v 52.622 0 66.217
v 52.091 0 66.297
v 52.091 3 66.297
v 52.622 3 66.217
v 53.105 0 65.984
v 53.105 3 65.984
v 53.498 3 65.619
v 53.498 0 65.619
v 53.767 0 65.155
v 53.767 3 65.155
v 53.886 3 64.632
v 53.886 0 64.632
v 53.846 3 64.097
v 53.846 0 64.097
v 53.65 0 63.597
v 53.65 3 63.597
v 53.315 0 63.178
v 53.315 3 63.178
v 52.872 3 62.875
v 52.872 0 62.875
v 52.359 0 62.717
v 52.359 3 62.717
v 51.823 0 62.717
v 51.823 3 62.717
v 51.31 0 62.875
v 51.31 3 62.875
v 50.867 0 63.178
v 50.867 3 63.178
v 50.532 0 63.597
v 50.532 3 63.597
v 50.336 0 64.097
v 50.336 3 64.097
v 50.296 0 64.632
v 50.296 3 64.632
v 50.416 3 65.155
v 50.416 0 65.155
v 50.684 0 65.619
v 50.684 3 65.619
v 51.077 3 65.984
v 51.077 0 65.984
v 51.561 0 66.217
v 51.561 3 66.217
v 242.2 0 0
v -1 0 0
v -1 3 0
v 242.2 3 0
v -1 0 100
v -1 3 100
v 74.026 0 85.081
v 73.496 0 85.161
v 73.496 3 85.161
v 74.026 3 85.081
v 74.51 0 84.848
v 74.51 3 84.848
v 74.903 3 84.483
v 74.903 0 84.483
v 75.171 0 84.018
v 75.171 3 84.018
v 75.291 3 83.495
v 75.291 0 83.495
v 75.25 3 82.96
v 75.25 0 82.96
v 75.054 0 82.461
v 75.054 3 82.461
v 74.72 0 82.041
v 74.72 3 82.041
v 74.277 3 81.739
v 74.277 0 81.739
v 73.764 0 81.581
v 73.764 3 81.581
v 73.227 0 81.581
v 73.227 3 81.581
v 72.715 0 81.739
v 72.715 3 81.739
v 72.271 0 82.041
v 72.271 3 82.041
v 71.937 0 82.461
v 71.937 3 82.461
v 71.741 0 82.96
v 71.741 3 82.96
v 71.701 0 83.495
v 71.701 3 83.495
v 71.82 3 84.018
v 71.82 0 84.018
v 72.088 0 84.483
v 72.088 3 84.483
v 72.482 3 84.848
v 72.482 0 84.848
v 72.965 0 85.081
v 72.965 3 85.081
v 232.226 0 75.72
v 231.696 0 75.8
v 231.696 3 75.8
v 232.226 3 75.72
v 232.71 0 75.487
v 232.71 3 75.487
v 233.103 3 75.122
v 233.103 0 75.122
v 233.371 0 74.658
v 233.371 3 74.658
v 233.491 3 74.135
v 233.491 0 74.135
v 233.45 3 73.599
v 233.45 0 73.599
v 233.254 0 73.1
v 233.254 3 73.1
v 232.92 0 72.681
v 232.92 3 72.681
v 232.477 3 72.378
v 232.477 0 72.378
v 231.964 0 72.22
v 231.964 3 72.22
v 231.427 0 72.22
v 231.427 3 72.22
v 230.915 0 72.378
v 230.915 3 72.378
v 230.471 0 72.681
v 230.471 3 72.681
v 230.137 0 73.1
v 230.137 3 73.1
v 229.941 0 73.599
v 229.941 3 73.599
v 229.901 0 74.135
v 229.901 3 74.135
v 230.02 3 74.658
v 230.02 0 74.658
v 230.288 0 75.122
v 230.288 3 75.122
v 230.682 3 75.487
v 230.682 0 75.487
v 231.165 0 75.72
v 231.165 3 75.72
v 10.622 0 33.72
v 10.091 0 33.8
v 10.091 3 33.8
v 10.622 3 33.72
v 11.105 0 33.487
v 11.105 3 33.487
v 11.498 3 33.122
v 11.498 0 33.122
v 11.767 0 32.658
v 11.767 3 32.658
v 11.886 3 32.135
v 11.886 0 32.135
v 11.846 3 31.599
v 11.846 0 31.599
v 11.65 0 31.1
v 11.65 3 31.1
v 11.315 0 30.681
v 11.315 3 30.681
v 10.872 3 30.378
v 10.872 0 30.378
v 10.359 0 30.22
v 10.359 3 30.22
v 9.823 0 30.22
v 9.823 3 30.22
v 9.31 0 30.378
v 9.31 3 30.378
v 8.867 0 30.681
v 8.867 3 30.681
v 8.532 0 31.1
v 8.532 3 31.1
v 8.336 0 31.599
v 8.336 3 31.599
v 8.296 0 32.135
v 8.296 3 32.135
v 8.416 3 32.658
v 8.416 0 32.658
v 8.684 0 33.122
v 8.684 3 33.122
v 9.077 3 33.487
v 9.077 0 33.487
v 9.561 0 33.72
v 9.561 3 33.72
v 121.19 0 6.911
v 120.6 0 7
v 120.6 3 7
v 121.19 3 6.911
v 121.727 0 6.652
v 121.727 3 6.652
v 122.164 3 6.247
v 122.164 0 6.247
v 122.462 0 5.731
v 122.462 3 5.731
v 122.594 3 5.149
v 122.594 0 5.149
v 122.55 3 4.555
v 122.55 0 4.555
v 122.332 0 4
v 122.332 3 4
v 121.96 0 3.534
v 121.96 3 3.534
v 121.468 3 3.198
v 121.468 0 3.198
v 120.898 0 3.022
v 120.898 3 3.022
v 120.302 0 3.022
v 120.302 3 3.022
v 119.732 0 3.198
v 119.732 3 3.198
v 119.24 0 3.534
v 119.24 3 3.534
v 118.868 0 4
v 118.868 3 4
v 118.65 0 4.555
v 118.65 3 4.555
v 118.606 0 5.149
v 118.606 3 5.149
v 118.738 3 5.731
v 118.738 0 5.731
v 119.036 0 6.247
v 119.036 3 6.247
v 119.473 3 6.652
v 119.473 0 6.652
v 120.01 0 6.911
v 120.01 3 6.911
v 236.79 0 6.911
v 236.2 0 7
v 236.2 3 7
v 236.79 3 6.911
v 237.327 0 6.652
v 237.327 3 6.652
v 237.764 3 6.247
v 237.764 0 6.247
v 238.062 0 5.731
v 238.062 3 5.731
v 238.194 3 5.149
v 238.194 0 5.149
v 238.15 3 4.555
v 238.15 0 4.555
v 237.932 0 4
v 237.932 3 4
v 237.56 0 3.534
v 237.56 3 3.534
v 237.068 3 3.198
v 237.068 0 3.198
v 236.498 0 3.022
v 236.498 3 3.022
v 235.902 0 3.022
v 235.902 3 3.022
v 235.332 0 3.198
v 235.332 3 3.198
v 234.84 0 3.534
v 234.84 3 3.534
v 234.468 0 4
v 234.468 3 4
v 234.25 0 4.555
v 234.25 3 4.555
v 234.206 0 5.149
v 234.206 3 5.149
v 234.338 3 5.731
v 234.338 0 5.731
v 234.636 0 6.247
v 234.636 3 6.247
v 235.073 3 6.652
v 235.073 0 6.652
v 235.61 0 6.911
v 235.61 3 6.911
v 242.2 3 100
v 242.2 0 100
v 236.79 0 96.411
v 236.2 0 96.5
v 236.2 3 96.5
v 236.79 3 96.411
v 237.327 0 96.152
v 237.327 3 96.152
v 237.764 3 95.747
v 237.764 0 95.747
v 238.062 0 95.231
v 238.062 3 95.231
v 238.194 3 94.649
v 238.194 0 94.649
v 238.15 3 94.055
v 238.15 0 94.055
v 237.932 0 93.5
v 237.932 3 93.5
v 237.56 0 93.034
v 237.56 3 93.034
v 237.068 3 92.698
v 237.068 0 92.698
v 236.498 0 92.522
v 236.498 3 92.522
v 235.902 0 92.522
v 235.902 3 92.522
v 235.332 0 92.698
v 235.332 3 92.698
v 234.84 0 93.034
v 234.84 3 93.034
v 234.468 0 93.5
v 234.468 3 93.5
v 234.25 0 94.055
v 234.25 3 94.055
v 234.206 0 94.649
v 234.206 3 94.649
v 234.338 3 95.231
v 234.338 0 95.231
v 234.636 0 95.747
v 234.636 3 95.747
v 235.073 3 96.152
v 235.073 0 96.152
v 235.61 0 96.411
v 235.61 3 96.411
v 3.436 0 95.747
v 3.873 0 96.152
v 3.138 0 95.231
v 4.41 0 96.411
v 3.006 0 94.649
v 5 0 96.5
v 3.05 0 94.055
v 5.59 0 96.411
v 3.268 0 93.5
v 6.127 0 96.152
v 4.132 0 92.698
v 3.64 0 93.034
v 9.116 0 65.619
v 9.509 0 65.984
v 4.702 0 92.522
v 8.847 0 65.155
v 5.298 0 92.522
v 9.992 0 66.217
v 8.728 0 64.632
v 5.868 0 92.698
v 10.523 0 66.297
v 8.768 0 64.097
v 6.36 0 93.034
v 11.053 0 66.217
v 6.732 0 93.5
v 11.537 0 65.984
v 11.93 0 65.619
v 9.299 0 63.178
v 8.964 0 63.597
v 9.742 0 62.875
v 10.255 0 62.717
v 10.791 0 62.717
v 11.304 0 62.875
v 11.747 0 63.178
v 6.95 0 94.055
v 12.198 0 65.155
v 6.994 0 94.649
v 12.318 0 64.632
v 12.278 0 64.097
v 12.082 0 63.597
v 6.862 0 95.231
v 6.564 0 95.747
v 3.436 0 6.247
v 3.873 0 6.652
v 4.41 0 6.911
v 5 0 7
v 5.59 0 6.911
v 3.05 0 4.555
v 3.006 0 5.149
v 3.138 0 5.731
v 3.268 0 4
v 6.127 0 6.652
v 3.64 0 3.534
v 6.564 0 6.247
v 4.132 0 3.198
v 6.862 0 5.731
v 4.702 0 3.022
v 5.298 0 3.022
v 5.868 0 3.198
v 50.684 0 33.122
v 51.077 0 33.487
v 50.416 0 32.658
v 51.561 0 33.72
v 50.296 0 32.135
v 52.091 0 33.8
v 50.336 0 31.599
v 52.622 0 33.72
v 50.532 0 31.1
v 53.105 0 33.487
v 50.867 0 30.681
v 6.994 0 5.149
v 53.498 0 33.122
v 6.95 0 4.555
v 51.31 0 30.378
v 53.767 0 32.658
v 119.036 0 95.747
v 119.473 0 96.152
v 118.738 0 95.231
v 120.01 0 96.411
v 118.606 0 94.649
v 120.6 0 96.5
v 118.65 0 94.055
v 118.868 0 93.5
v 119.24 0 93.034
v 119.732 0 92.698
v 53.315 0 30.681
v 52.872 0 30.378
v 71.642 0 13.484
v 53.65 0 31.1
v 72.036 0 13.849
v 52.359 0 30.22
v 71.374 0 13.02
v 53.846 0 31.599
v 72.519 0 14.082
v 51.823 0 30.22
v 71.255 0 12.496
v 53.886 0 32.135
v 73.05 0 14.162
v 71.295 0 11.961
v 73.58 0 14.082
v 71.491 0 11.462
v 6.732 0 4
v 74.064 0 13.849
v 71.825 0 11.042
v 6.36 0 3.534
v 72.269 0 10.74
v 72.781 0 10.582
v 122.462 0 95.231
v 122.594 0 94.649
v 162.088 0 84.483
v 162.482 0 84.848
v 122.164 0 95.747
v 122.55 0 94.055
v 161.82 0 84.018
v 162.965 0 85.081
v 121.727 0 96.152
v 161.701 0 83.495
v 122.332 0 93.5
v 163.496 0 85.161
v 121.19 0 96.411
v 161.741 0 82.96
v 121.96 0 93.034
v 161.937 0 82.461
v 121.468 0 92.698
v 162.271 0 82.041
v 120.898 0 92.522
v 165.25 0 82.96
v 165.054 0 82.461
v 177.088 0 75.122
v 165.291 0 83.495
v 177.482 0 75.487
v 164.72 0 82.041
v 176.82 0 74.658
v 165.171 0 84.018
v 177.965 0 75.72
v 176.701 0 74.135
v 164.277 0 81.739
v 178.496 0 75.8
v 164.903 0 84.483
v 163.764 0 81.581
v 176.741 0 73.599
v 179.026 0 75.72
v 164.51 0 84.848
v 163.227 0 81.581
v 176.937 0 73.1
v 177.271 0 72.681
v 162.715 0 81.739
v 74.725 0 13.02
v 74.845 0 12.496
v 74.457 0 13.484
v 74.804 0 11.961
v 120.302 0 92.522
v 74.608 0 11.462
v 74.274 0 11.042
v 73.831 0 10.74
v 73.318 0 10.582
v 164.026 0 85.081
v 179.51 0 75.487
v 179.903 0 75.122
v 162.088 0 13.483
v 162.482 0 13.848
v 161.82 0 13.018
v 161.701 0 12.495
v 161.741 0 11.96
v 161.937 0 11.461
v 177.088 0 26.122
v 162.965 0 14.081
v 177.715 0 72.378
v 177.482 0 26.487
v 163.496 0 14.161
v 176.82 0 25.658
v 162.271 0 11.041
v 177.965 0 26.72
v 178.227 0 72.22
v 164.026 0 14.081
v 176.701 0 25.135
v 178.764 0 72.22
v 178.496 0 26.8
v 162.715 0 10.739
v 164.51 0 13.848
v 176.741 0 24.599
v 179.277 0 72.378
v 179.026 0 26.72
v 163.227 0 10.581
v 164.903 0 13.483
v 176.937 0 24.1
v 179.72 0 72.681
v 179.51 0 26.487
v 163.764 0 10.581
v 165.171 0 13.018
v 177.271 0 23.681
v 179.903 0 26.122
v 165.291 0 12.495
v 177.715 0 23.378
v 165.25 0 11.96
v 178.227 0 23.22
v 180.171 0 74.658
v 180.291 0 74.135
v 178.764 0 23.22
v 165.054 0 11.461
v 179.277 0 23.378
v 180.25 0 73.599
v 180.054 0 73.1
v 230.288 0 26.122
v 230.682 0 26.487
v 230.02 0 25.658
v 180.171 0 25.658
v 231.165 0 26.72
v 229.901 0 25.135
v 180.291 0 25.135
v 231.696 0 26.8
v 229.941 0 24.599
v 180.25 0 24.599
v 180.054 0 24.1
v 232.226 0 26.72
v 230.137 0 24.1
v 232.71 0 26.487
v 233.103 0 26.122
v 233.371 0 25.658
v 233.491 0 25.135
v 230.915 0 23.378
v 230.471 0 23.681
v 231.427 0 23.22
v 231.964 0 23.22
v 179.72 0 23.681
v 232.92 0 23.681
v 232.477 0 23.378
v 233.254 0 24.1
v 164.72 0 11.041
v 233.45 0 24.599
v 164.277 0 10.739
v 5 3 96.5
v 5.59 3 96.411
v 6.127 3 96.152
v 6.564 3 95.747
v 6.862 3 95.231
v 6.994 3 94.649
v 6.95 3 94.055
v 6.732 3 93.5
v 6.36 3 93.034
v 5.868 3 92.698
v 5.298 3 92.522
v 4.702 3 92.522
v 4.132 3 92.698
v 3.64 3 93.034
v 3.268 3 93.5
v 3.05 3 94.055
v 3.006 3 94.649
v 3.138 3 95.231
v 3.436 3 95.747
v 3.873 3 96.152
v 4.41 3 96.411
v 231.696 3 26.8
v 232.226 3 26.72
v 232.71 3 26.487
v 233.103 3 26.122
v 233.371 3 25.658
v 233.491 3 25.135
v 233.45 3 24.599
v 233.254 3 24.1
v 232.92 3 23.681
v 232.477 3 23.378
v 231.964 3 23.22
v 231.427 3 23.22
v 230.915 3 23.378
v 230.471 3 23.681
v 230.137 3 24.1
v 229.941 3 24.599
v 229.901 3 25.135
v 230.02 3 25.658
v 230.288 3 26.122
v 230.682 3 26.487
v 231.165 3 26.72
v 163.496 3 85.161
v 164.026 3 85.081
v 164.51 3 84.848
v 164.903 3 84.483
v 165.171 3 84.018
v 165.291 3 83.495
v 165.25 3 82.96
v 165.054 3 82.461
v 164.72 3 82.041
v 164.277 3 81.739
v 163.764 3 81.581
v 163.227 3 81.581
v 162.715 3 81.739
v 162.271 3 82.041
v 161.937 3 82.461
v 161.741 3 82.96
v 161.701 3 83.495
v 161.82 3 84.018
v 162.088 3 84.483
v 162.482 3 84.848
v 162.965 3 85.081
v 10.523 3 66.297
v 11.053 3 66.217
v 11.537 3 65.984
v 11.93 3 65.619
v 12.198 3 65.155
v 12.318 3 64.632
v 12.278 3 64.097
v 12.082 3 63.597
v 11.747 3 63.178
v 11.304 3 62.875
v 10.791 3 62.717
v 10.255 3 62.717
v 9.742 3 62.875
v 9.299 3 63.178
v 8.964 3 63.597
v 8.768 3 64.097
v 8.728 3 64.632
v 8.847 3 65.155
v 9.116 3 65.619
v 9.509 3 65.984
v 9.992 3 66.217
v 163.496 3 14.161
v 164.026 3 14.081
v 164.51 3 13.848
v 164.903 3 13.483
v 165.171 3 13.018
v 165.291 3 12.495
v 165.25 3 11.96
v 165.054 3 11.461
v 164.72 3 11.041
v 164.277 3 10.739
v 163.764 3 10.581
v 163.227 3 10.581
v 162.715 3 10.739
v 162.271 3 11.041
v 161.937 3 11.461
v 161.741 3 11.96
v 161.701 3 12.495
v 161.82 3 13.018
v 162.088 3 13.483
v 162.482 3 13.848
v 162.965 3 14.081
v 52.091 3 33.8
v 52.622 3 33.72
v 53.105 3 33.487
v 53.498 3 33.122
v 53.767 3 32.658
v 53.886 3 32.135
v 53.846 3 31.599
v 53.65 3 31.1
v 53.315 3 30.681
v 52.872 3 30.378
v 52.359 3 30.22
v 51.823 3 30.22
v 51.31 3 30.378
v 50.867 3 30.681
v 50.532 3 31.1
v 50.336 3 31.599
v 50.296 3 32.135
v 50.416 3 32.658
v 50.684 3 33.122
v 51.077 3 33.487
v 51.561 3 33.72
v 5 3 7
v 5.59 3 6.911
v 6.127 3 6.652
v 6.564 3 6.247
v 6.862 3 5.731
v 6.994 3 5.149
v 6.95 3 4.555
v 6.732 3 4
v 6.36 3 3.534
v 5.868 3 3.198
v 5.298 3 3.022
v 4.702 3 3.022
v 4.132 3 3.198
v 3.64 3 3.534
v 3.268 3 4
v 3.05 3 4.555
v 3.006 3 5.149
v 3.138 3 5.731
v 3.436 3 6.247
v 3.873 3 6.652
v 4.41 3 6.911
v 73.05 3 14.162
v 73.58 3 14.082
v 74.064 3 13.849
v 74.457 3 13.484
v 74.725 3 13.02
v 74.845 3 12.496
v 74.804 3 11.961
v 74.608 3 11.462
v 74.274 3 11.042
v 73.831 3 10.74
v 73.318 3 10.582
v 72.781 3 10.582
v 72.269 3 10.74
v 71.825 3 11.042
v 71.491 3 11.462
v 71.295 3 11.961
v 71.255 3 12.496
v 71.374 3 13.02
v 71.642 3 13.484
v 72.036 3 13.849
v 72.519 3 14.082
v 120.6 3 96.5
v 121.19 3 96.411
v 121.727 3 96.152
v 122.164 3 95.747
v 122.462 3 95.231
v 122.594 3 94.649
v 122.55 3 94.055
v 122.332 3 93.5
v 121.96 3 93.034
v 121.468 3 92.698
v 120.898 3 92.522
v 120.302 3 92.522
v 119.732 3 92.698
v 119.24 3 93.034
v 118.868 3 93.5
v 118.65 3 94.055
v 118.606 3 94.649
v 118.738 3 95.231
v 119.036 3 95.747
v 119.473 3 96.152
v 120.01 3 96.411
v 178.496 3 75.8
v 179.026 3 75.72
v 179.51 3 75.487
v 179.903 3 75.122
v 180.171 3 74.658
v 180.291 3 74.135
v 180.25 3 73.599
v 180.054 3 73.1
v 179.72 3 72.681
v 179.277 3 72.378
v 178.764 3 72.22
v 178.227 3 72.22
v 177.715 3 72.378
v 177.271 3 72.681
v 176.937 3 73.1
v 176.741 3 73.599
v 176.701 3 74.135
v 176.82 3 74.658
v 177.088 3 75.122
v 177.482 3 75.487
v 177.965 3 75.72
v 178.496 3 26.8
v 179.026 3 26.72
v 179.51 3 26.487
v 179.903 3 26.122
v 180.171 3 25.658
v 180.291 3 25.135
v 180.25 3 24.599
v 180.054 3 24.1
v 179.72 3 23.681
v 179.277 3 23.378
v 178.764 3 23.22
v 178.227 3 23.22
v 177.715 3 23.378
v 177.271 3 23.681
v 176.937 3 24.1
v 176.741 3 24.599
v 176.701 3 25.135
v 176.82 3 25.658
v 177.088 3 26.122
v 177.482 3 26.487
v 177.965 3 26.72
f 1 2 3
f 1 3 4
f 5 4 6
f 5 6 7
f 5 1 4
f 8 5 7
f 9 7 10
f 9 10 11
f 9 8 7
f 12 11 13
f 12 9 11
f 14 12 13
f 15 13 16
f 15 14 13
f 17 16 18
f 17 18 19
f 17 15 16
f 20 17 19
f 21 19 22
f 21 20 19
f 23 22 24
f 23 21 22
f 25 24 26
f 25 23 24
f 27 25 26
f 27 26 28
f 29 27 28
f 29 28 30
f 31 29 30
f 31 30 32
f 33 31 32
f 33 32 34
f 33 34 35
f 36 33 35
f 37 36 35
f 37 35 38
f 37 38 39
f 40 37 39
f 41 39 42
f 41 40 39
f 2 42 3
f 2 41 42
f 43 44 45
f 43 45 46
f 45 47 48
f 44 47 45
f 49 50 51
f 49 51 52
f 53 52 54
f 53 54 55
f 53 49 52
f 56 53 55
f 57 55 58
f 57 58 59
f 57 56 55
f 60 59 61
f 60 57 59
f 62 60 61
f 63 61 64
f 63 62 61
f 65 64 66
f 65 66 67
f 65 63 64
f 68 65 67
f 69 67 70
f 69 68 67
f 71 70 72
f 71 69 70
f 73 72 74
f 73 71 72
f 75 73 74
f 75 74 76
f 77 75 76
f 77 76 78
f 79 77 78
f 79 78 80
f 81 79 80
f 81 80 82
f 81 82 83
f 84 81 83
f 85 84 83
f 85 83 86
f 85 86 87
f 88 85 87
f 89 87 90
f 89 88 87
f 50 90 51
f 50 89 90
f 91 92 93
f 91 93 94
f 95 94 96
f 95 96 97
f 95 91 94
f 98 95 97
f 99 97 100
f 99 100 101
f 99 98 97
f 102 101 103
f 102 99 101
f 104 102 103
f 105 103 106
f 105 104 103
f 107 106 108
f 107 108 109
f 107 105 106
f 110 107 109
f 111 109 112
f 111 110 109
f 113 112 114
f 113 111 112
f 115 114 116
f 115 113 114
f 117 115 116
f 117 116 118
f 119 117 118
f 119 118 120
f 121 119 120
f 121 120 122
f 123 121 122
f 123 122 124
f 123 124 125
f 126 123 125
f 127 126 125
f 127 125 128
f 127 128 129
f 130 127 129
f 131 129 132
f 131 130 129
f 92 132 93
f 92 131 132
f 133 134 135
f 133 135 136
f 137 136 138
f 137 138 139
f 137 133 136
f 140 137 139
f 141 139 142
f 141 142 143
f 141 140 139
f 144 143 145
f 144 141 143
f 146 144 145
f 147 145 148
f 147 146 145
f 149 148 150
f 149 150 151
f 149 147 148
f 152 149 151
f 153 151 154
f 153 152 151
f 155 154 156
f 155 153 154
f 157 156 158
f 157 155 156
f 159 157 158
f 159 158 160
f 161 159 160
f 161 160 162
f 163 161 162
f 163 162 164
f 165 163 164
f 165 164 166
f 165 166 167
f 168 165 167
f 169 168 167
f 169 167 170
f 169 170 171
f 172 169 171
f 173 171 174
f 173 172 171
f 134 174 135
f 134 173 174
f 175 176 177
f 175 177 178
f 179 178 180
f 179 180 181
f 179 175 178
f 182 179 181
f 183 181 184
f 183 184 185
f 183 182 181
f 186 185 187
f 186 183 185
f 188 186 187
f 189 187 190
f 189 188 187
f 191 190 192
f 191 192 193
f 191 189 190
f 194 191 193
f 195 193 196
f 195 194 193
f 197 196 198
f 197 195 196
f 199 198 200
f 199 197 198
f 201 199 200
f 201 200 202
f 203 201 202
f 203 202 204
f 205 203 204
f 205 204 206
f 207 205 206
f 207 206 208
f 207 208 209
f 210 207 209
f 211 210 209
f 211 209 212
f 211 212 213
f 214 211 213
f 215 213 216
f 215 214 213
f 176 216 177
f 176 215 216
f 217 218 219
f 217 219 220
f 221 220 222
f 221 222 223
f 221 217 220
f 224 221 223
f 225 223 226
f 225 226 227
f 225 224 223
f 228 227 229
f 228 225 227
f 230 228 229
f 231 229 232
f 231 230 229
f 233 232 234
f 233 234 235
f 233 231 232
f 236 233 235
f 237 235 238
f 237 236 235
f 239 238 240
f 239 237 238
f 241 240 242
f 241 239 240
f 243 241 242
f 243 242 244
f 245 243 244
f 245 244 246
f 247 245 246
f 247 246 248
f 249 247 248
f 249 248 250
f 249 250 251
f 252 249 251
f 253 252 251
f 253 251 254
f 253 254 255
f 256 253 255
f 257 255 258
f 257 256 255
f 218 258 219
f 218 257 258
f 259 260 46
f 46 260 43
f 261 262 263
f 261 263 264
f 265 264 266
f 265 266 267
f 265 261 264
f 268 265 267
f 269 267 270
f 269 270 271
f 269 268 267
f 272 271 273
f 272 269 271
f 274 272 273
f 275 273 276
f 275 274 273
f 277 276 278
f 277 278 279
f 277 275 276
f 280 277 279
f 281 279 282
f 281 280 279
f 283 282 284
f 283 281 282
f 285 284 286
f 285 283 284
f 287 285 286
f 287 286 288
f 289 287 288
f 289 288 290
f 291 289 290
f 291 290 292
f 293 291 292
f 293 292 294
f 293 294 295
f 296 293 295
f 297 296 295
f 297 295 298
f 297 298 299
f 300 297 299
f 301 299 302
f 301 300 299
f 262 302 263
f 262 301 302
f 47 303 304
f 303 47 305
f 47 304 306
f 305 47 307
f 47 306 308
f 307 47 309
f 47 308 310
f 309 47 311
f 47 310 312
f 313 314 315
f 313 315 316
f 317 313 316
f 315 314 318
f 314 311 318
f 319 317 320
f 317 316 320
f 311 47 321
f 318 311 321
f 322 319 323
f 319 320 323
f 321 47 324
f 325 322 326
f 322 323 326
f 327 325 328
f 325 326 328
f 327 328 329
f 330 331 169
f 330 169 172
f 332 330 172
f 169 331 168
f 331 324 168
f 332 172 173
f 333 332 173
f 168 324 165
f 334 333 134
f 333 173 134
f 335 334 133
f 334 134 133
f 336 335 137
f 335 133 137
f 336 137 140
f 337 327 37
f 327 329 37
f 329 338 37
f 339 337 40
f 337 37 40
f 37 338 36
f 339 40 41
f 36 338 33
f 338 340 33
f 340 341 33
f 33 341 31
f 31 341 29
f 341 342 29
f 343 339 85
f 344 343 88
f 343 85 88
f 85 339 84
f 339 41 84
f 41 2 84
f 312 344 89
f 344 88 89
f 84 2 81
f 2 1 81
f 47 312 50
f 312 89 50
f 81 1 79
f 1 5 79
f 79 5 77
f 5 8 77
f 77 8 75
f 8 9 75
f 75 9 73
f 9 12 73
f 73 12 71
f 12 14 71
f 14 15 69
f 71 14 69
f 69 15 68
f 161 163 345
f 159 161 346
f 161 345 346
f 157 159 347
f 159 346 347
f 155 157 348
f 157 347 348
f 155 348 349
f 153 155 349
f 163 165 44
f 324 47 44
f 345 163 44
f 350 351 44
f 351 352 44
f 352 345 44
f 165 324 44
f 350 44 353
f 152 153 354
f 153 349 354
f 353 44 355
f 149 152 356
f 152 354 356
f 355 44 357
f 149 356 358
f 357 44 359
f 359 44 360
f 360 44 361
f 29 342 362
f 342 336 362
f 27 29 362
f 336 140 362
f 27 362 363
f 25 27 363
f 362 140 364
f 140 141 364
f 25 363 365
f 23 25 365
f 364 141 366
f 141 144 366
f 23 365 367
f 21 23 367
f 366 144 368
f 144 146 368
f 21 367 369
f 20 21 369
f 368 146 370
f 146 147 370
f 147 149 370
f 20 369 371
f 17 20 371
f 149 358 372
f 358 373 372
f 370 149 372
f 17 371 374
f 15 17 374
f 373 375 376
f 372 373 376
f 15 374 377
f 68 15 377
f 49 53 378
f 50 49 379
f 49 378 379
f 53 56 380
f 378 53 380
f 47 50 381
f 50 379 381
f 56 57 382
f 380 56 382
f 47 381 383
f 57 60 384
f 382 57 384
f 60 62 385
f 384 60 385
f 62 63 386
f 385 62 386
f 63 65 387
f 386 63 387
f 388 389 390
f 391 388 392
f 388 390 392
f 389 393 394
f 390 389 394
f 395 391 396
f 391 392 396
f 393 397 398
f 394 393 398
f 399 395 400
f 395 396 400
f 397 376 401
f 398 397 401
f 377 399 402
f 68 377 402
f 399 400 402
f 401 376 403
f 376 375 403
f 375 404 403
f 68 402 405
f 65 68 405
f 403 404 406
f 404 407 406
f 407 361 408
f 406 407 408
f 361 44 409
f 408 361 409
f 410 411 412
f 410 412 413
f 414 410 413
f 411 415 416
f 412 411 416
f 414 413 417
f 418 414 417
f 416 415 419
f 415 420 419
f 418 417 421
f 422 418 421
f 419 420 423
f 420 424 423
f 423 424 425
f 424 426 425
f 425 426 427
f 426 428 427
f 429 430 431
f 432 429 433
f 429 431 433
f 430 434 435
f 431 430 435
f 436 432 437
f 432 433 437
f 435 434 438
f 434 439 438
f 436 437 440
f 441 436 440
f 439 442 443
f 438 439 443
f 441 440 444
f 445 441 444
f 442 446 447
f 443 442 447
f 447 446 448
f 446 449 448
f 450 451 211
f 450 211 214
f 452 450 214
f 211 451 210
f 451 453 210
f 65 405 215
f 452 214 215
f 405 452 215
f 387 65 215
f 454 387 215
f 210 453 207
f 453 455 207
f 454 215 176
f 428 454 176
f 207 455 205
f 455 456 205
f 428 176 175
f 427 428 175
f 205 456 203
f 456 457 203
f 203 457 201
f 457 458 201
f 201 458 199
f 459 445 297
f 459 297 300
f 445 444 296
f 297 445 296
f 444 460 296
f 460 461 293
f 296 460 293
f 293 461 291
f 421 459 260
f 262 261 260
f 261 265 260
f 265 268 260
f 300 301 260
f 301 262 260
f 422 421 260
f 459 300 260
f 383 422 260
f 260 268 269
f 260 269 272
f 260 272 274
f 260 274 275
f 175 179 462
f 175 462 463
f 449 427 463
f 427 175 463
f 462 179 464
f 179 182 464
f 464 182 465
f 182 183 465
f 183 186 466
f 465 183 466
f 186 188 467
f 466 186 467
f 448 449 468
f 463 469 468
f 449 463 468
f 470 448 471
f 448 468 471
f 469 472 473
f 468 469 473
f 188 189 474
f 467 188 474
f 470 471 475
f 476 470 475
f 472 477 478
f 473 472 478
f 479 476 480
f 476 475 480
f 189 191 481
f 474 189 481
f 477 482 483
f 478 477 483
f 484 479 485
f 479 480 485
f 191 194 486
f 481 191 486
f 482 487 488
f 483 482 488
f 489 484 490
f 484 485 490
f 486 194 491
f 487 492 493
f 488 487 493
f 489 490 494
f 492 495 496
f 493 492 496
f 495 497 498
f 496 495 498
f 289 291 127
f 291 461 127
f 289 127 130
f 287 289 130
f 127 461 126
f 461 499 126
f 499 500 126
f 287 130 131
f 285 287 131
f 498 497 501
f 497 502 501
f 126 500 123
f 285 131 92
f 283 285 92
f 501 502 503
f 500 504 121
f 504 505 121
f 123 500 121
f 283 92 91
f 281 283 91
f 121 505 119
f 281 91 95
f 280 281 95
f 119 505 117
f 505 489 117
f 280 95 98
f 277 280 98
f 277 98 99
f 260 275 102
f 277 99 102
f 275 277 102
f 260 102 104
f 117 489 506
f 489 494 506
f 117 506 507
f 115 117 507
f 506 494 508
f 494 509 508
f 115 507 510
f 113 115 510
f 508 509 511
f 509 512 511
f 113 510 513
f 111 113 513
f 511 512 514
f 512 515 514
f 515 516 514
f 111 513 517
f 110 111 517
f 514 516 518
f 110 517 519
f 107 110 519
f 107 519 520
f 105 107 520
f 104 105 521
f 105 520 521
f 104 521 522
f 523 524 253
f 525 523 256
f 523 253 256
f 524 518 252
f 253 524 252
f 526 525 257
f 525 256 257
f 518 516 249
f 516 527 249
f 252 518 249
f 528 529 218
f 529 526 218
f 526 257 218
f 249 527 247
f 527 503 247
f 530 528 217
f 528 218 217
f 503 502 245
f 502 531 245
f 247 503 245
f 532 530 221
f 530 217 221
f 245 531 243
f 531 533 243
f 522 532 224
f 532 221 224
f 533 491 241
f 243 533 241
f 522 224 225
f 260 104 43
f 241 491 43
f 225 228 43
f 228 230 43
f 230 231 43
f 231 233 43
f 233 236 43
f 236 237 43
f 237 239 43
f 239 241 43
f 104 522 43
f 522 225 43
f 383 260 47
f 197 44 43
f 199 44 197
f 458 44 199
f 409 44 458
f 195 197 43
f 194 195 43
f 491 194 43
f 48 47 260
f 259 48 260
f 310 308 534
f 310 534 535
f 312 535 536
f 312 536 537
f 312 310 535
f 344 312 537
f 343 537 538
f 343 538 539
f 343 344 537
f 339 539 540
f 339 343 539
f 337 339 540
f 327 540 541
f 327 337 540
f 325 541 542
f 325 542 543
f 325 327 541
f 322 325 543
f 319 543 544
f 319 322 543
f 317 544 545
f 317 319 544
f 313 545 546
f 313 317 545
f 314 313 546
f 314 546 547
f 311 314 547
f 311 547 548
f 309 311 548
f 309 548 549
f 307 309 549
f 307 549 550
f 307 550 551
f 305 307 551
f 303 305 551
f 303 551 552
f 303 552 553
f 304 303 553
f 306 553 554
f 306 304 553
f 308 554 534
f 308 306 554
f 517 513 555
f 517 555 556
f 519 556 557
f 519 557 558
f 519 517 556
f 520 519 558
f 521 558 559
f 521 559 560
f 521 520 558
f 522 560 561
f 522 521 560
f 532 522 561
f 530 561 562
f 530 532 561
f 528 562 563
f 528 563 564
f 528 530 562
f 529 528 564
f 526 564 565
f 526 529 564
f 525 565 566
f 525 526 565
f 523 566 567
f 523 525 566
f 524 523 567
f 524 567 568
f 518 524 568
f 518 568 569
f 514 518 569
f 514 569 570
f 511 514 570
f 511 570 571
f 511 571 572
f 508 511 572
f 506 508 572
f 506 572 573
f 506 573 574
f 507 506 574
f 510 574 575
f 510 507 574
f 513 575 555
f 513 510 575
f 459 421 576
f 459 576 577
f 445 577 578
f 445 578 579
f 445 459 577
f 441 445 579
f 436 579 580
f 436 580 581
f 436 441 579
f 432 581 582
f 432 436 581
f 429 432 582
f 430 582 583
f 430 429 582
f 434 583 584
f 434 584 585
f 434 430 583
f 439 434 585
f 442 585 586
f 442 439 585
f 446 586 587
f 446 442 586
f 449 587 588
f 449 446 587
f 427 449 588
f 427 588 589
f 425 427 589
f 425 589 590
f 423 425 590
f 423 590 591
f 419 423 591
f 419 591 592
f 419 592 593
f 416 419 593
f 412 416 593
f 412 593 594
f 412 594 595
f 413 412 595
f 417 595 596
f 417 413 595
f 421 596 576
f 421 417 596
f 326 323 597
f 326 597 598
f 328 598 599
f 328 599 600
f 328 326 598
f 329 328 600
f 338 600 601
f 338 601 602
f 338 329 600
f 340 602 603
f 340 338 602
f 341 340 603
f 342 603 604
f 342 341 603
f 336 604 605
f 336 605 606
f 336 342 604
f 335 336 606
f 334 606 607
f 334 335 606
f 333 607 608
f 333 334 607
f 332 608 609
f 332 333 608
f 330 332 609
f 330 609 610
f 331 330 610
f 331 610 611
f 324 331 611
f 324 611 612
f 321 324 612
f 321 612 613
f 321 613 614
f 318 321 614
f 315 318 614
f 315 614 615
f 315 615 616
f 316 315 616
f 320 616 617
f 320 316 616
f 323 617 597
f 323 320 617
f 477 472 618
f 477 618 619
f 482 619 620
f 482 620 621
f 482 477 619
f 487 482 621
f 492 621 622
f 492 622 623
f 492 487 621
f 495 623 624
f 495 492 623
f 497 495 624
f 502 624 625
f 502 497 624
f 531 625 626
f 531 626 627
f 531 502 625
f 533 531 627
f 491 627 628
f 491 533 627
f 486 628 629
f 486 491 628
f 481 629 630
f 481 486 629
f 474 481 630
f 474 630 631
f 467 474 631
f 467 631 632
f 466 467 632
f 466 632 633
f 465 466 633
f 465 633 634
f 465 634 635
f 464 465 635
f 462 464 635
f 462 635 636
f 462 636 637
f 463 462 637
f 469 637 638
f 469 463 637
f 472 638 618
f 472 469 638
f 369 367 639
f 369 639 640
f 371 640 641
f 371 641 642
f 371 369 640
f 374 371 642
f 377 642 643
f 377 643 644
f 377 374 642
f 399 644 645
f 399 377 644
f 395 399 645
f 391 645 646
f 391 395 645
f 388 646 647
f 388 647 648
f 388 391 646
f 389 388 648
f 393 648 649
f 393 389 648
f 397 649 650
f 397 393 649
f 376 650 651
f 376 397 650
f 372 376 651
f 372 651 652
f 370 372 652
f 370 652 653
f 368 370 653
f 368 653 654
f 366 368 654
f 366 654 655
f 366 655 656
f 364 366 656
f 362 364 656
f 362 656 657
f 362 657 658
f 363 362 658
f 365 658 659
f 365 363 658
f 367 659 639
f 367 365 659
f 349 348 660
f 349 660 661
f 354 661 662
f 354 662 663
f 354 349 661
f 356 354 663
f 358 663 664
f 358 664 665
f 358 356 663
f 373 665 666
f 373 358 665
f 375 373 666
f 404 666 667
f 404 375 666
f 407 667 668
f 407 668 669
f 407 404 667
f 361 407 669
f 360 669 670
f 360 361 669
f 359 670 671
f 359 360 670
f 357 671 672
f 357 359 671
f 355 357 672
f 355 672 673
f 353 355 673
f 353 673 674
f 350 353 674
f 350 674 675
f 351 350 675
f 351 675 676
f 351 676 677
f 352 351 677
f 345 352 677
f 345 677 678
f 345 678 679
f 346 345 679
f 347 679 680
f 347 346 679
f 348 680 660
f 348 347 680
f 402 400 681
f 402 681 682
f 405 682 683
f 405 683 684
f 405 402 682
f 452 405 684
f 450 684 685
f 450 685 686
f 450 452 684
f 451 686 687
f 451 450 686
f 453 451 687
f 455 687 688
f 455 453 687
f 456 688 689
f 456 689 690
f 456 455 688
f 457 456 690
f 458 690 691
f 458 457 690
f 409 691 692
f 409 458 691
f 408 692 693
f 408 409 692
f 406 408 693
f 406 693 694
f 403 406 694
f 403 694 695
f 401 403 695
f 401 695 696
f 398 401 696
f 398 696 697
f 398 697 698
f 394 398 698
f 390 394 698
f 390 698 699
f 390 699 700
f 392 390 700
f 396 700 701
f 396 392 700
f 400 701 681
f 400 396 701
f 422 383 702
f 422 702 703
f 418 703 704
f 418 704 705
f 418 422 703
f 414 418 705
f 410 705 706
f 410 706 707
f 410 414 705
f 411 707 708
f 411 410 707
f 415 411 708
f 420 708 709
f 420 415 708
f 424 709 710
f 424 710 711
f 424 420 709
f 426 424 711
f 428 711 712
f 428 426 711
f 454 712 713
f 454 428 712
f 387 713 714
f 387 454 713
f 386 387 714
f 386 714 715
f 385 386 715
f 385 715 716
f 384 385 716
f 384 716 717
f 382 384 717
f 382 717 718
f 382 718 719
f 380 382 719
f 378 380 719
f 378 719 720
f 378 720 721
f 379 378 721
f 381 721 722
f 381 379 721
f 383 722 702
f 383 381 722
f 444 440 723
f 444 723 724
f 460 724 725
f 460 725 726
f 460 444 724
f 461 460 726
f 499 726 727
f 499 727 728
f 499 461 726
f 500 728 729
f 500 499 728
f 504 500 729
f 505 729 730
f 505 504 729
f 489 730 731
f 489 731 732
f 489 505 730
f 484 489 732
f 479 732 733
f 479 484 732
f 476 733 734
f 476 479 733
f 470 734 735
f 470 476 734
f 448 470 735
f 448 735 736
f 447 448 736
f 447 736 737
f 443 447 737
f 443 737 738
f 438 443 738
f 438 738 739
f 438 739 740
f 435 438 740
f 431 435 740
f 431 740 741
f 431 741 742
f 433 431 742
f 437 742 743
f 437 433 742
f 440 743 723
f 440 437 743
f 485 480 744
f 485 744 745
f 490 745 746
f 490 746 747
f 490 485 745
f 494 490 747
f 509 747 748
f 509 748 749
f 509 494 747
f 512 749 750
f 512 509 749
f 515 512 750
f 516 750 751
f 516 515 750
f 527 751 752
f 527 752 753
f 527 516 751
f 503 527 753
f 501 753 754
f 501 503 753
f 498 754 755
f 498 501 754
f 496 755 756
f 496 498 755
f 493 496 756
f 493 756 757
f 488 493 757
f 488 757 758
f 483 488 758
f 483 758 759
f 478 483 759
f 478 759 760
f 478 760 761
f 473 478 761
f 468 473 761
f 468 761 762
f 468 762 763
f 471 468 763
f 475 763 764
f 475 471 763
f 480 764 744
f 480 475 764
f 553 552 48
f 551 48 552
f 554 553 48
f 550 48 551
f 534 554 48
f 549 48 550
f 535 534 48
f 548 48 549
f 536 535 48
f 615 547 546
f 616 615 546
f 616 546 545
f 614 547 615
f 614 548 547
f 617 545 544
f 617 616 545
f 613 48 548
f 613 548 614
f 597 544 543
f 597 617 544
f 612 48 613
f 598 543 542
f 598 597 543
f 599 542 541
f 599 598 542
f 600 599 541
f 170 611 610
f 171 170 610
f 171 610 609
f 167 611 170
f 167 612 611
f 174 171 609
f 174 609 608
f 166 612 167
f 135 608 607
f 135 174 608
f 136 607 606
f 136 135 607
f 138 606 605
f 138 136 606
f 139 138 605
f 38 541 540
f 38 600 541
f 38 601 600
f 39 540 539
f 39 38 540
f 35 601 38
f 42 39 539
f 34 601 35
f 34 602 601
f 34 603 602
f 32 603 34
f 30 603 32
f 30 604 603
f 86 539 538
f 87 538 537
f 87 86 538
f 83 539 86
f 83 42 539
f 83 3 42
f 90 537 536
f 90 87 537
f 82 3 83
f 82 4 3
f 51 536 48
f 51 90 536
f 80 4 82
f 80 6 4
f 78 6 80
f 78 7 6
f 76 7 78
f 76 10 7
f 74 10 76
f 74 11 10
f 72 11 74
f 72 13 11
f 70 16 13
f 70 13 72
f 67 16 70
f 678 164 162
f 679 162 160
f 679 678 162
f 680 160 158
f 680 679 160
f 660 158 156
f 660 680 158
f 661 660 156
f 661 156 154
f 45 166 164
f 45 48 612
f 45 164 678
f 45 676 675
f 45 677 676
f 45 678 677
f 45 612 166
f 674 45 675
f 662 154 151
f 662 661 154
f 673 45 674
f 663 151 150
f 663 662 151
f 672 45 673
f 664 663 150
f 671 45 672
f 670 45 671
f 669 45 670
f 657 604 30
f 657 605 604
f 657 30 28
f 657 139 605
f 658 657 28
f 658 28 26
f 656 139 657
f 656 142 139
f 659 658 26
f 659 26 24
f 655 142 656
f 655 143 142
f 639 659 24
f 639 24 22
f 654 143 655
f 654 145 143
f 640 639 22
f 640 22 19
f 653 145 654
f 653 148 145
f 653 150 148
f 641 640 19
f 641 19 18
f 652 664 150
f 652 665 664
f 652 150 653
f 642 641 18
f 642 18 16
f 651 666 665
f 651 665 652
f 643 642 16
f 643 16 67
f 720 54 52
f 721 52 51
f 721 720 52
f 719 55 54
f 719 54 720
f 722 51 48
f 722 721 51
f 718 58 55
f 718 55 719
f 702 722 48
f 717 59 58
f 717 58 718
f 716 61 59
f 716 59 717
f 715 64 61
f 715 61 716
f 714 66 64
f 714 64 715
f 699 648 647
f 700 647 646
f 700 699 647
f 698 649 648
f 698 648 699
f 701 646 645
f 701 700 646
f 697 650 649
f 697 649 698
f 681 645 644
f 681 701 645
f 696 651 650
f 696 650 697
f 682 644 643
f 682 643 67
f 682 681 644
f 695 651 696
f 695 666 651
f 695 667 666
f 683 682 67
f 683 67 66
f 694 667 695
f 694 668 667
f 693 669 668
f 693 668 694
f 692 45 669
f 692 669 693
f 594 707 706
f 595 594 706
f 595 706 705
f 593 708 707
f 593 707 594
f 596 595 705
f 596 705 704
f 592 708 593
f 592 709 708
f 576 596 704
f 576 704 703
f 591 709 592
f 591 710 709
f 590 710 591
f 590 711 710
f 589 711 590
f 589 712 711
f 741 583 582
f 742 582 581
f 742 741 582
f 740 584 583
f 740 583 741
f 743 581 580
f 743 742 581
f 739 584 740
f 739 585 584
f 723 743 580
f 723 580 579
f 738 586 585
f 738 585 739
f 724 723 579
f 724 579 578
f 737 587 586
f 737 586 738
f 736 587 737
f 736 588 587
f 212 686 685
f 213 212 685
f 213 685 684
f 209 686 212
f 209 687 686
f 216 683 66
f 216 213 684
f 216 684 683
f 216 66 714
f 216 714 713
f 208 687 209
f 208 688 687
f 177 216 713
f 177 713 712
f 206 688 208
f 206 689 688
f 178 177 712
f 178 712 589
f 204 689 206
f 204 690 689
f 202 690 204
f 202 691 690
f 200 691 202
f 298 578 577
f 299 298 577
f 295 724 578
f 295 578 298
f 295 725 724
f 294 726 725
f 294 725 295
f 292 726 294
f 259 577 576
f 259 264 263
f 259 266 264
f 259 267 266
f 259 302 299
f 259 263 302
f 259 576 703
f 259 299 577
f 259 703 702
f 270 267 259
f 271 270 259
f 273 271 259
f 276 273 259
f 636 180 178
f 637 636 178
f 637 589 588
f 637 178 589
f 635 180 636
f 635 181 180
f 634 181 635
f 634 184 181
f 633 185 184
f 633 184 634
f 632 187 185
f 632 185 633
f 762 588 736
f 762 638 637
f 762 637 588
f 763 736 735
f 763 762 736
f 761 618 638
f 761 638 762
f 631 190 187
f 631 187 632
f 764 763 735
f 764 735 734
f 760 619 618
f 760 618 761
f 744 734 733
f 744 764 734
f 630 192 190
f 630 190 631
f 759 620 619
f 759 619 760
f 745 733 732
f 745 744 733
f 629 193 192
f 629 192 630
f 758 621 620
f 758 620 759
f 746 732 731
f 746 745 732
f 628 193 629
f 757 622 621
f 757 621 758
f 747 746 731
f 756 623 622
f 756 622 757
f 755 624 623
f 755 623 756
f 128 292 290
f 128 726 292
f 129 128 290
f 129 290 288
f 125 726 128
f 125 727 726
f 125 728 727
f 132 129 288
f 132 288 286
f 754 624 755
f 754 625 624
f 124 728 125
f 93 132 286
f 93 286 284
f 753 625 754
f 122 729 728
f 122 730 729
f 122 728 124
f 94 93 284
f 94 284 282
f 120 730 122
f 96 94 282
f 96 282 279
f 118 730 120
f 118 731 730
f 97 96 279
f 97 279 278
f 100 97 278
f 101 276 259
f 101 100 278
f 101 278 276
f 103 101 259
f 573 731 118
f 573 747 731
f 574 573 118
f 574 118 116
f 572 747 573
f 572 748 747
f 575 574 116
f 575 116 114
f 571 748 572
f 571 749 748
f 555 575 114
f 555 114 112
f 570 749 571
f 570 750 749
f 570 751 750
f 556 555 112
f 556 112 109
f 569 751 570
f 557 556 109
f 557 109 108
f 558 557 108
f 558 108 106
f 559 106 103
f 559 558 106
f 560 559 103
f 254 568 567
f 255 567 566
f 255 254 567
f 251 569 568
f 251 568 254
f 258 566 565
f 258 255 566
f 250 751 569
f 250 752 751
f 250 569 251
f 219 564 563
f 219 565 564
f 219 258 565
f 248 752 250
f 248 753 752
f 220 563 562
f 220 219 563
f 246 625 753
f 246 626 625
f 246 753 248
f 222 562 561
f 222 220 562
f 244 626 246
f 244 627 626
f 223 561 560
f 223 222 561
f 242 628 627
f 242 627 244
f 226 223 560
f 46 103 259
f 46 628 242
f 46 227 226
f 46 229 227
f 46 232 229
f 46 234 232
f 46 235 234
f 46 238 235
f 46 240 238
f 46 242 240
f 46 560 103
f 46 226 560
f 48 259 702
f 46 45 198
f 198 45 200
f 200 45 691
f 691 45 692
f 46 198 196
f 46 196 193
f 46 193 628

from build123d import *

# Parameters (mm, degrees)
SKETCH_181_W    = 243.2
SKETCH_181_H    = 100
SKETCH_181_R    = 1.8
SKETCH_181_R_2  = 2
EXTRUDE_3_DEPTH = 3


with BuildPart() as part:
    # Sketch 181 → 凸台-拉伸3 (new body)
    with BuildSketch(Plane(origin=(0, 0, 0), x_dir=(1, 0, 0), z_dir=(0, 1, 0))):
        with Locations((120.6, -50)):
            Rectangle(SKETCH_181_W, SKETCH_181_H)
        with Locations(Location((73.049576153, -12.361926171, 0), (0, 0, 270))):  # turned: the seam where the file's is
            Circle(SKETCH_181_R, mode=Mode.SUBTRACT)
        with Locations(Location((73.495550598, -83.360525501, 0), (0, 0, 270))):  # turned: the seam where the file's is
            Circle(SKETCH_181_R, mode=Mode.SUBTRACT)
        with Locations(Location((163.495550598, -12.360525501, 0), (0, 0, 270))):  # turned: the seam where the file's is
            Circle(SKETCH_181_R, mode=Mode.SUBTRACT)
        with Locations(Location((163.495550598, -83.360525501, 0), (0, 0, 270))):  # turned: the seam where the file's is
            Circle(SKETCH_181_R, mode=Mode.SUBTRACT)
        with Locations(Location((10.091186927, -32, 0), (0, 0, 270))):  # turned: the seam where the file's is
            Circle(SKETCH_181_R, mode=Mode.SUBTRACT)
        with Locations(Location((10.522883477, -64.497132767, 0), (0, 0, 270))):  # turned: the seam where the file's is
            Circle(SKETCH_181_R, mode=Mode.SUBTRACT)
        with Locations(Location((52.091186927, -32, 0), (0, 0, 270))):  # turned: the seam where the file's is
            Circle(SKETCH_181_R, mode=Mode.SUBTRACT)
        with Locations(Location((52.091186927, -64.497132767, 0), (0, 0, 270))):  # turned: the seam where the file's is
            Circle(SKETCH_181_R, mode=Mode.SUBTRACT)
        with Locations(Location((120.6, -5, 0), (0, 0, 270))):  # turned: the seam where the file's is
            Circle(SKETCH_181_R_2, mode=Mode.SUBTRACT)
        with Locations(Location((120.6, -94.5, 0), (0, 0, 270))):  # turned: the seam where the file's is
            Circle(SKETCH_181_R_2, mode=Mode.SUBTRACT)
        with Locations(Location((5, -5, 0), (0, 0, 270))):  # turned: the seam where the file's is
            Circle(SKETCH_181_R_2, mode=Mode.SUBTRACT)
        with Locations(Location((5, -94.5, 0), (0, 0, 270))):  # turned: the seam where the file's is
            Circle(SKETCH_181_R_2, mode=Mode.SUBTRACT)
        with Locations(Location((236.2, -5, 0), (0, 0, 270))):  # turned: the seam where the file's is
            Circle(SKETCH_181_R_2, mode=Mode.SUBTRACT)
        with Locations(Location((236.2, -94.5, 0), (0, 0, 270))):  # turned: the seam where the file's is
            Circle(SKETCH_181_R_2, mode=Mode.SUBTRACT)
        with Locations(Location((231.695550598, -25, 0), (0, 0, 270))):  # turned: the seam where the file's is
            Circle(SKETCH_181_R, mode=Mode.SUBTRACT)
        with Locations(Location((231.695550598, -74, 0), (0, 0, 270))):  # turned: the seam where the file's is
            Circle(SKETCH_181_R, mode=Mode.SUBTRACT)
        with Locations(Location((178.495550598, -74, 0), (0, 0, 270))):  # turned: the seam where the file's is
            Circle(SKETCH_181_R, mode=Mode.SUBTRACT)
        with Locations(Location((178.495550598, -25, 0), (0, 0, 270))):  # turned: the seam where the file's is
            Circle(SKETCH_181_R, mode=Mode.SUBTRACT)
    extrude(amount=EXTRUDE_3_DEPTH)


solid = part.part
